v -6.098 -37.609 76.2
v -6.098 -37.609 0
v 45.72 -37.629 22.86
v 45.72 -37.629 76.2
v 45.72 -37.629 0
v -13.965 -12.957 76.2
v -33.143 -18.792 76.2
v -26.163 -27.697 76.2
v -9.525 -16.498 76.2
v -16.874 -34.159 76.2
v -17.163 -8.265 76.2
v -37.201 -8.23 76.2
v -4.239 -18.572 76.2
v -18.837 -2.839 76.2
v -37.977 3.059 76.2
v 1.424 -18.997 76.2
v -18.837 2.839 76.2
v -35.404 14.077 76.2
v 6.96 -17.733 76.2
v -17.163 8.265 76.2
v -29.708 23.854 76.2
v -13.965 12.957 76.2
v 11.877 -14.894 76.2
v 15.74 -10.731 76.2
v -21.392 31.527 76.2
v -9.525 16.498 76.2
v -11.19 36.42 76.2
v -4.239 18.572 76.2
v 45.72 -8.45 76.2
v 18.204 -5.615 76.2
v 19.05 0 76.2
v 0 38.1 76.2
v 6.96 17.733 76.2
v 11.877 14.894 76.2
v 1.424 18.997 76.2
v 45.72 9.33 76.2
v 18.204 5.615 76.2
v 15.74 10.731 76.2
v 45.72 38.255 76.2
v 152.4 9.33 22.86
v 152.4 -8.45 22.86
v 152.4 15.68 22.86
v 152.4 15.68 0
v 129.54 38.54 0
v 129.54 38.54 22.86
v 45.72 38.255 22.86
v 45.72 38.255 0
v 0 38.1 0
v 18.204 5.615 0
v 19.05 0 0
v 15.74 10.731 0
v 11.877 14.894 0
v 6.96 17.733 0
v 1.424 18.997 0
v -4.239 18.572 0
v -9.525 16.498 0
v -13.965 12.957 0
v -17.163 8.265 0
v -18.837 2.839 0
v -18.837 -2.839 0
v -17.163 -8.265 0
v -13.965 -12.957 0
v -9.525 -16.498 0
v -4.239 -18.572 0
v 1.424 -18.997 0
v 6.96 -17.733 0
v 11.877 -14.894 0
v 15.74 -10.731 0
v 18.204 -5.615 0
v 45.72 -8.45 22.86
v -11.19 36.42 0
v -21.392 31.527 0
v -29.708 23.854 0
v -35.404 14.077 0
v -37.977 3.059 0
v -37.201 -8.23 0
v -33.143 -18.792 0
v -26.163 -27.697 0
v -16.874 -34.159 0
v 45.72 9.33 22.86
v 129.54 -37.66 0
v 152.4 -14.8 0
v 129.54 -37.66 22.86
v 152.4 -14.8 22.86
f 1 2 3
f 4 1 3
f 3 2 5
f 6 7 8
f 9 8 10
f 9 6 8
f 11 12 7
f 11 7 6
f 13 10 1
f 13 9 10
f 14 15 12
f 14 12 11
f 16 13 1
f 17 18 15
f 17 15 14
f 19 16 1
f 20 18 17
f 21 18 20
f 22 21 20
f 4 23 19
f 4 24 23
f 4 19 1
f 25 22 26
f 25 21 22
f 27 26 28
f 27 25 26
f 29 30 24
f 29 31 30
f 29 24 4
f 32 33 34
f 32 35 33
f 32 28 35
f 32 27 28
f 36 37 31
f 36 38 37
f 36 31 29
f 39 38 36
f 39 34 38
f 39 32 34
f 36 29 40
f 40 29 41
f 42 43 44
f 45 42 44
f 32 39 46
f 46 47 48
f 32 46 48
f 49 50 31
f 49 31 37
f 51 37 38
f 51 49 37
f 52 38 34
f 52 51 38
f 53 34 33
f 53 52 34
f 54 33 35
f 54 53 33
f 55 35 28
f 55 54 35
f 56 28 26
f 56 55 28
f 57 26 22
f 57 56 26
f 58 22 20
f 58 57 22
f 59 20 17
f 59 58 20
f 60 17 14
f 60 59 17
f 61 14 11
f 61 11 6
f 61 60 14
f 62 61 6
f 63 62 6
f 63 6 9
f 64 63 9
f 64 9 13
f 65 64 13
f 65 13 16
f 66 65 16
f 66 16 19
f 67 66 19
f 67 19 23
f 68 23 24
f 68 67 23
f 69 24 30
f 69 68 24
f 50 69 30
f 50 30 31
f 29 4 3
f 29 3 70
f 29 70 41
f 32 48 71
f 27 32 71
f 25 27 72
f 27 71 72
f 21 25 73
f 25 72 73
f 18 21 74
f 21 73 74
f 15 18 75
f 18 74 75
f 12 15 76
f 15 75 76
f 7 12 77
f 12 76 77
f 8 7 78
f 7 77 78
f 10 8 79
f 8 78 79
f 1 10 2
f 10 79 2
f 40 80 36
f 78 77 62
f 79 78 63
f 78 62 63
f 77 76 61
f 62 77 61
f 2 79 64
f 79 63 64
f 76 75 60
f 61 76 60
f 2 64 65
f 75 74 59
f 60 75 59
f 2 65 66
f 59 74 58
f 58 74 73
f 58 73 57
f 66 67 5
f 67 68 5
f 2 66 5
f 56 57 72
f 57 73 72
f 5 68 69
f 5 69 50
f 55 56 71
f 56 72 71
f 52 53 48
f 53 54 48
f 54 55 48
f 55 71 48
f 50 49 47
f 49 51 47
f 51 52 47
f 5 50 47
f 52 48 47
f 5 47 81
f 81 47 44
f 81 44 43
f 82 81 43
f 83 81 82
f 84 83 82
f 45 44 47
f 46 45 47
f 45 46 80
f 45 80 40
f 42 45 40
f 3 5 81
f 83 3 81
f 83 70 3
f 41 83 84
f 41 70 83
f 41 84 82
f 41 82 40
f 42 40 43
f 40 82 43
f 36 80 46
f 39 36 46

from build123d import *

# Parameters (mm, degrees)
F1_DEPTH = 22.86
F0_R     = 19.05
F2_DEPTH = 76.2
F3_DEPTH = 22.86
F0_W     = 106.68
F0_H     = 17.78
F4_DEPTH = 76.2
F6_DEPTH = 25.4


with BuildPart() as f1:
    # F0 (on Top) → F1 (new body)
    with BuildSketch(Plane.XY):
        Polygon((45.72, -8.450483), (45.72, -37.628572), (129.54, -37.660483), (152.4, -14.800483), (152.4, -8.450483), align=None)
    extrude(amount=F1_DEPTH)

    # F0 (on Top) → F2 (join)
    with BuildSketch(Plane.XY):
        with BuildLine():
            Line((45.72, 38.255124), (0, 38.1))
            ThreePointArc((0, 38.1), (-37.977013, 3.05884), (-6.097931, -37.608845))
            Line((-6.097931, -37.608845), (45.72, -37.628572))
            Line((45.72, -37.628572), (45.72, -8.450483))
            Line((45.72, -8.450483), (45.72, 9.329517))
            Line((45.72, 9.329517), (45.72, 38.255124))
        make_face()
        Circle(F0_R, mode=Mode.SUBTRACT)
    extrude(amount=F2_DEPTH)

    # F0 (on Top) → F3 (join)
    with BuildSketch(Plane.XY):
        Polygon((129.54, 38.539517), (45.72, 38.255124), (45.72, 9.329517), (152.4, 9.329517), (152.4, 15.679517), align=None)
    extrude(amount=F3_DEPTH)

    # F0 (on Top) → F4 (join)
    with BuildSketch(Plane.XY):
        with Locations((99.06, 0.439517)):
            Rectangle(F0_W, F0_H)
    extrude(amount=F4_DEPTH)

    # F5 (on face) → F6 (cut)
    with BuildSketch(Plane.XZ.offset(8.450483)):
        Polygon((152.4, 76.2), (45.72, 76.2), (152.4, 22.86), align=None)
    extrude(amount=-F6_DEPTH, mode=Mode.SUBTRACT)


solid = f1.part
